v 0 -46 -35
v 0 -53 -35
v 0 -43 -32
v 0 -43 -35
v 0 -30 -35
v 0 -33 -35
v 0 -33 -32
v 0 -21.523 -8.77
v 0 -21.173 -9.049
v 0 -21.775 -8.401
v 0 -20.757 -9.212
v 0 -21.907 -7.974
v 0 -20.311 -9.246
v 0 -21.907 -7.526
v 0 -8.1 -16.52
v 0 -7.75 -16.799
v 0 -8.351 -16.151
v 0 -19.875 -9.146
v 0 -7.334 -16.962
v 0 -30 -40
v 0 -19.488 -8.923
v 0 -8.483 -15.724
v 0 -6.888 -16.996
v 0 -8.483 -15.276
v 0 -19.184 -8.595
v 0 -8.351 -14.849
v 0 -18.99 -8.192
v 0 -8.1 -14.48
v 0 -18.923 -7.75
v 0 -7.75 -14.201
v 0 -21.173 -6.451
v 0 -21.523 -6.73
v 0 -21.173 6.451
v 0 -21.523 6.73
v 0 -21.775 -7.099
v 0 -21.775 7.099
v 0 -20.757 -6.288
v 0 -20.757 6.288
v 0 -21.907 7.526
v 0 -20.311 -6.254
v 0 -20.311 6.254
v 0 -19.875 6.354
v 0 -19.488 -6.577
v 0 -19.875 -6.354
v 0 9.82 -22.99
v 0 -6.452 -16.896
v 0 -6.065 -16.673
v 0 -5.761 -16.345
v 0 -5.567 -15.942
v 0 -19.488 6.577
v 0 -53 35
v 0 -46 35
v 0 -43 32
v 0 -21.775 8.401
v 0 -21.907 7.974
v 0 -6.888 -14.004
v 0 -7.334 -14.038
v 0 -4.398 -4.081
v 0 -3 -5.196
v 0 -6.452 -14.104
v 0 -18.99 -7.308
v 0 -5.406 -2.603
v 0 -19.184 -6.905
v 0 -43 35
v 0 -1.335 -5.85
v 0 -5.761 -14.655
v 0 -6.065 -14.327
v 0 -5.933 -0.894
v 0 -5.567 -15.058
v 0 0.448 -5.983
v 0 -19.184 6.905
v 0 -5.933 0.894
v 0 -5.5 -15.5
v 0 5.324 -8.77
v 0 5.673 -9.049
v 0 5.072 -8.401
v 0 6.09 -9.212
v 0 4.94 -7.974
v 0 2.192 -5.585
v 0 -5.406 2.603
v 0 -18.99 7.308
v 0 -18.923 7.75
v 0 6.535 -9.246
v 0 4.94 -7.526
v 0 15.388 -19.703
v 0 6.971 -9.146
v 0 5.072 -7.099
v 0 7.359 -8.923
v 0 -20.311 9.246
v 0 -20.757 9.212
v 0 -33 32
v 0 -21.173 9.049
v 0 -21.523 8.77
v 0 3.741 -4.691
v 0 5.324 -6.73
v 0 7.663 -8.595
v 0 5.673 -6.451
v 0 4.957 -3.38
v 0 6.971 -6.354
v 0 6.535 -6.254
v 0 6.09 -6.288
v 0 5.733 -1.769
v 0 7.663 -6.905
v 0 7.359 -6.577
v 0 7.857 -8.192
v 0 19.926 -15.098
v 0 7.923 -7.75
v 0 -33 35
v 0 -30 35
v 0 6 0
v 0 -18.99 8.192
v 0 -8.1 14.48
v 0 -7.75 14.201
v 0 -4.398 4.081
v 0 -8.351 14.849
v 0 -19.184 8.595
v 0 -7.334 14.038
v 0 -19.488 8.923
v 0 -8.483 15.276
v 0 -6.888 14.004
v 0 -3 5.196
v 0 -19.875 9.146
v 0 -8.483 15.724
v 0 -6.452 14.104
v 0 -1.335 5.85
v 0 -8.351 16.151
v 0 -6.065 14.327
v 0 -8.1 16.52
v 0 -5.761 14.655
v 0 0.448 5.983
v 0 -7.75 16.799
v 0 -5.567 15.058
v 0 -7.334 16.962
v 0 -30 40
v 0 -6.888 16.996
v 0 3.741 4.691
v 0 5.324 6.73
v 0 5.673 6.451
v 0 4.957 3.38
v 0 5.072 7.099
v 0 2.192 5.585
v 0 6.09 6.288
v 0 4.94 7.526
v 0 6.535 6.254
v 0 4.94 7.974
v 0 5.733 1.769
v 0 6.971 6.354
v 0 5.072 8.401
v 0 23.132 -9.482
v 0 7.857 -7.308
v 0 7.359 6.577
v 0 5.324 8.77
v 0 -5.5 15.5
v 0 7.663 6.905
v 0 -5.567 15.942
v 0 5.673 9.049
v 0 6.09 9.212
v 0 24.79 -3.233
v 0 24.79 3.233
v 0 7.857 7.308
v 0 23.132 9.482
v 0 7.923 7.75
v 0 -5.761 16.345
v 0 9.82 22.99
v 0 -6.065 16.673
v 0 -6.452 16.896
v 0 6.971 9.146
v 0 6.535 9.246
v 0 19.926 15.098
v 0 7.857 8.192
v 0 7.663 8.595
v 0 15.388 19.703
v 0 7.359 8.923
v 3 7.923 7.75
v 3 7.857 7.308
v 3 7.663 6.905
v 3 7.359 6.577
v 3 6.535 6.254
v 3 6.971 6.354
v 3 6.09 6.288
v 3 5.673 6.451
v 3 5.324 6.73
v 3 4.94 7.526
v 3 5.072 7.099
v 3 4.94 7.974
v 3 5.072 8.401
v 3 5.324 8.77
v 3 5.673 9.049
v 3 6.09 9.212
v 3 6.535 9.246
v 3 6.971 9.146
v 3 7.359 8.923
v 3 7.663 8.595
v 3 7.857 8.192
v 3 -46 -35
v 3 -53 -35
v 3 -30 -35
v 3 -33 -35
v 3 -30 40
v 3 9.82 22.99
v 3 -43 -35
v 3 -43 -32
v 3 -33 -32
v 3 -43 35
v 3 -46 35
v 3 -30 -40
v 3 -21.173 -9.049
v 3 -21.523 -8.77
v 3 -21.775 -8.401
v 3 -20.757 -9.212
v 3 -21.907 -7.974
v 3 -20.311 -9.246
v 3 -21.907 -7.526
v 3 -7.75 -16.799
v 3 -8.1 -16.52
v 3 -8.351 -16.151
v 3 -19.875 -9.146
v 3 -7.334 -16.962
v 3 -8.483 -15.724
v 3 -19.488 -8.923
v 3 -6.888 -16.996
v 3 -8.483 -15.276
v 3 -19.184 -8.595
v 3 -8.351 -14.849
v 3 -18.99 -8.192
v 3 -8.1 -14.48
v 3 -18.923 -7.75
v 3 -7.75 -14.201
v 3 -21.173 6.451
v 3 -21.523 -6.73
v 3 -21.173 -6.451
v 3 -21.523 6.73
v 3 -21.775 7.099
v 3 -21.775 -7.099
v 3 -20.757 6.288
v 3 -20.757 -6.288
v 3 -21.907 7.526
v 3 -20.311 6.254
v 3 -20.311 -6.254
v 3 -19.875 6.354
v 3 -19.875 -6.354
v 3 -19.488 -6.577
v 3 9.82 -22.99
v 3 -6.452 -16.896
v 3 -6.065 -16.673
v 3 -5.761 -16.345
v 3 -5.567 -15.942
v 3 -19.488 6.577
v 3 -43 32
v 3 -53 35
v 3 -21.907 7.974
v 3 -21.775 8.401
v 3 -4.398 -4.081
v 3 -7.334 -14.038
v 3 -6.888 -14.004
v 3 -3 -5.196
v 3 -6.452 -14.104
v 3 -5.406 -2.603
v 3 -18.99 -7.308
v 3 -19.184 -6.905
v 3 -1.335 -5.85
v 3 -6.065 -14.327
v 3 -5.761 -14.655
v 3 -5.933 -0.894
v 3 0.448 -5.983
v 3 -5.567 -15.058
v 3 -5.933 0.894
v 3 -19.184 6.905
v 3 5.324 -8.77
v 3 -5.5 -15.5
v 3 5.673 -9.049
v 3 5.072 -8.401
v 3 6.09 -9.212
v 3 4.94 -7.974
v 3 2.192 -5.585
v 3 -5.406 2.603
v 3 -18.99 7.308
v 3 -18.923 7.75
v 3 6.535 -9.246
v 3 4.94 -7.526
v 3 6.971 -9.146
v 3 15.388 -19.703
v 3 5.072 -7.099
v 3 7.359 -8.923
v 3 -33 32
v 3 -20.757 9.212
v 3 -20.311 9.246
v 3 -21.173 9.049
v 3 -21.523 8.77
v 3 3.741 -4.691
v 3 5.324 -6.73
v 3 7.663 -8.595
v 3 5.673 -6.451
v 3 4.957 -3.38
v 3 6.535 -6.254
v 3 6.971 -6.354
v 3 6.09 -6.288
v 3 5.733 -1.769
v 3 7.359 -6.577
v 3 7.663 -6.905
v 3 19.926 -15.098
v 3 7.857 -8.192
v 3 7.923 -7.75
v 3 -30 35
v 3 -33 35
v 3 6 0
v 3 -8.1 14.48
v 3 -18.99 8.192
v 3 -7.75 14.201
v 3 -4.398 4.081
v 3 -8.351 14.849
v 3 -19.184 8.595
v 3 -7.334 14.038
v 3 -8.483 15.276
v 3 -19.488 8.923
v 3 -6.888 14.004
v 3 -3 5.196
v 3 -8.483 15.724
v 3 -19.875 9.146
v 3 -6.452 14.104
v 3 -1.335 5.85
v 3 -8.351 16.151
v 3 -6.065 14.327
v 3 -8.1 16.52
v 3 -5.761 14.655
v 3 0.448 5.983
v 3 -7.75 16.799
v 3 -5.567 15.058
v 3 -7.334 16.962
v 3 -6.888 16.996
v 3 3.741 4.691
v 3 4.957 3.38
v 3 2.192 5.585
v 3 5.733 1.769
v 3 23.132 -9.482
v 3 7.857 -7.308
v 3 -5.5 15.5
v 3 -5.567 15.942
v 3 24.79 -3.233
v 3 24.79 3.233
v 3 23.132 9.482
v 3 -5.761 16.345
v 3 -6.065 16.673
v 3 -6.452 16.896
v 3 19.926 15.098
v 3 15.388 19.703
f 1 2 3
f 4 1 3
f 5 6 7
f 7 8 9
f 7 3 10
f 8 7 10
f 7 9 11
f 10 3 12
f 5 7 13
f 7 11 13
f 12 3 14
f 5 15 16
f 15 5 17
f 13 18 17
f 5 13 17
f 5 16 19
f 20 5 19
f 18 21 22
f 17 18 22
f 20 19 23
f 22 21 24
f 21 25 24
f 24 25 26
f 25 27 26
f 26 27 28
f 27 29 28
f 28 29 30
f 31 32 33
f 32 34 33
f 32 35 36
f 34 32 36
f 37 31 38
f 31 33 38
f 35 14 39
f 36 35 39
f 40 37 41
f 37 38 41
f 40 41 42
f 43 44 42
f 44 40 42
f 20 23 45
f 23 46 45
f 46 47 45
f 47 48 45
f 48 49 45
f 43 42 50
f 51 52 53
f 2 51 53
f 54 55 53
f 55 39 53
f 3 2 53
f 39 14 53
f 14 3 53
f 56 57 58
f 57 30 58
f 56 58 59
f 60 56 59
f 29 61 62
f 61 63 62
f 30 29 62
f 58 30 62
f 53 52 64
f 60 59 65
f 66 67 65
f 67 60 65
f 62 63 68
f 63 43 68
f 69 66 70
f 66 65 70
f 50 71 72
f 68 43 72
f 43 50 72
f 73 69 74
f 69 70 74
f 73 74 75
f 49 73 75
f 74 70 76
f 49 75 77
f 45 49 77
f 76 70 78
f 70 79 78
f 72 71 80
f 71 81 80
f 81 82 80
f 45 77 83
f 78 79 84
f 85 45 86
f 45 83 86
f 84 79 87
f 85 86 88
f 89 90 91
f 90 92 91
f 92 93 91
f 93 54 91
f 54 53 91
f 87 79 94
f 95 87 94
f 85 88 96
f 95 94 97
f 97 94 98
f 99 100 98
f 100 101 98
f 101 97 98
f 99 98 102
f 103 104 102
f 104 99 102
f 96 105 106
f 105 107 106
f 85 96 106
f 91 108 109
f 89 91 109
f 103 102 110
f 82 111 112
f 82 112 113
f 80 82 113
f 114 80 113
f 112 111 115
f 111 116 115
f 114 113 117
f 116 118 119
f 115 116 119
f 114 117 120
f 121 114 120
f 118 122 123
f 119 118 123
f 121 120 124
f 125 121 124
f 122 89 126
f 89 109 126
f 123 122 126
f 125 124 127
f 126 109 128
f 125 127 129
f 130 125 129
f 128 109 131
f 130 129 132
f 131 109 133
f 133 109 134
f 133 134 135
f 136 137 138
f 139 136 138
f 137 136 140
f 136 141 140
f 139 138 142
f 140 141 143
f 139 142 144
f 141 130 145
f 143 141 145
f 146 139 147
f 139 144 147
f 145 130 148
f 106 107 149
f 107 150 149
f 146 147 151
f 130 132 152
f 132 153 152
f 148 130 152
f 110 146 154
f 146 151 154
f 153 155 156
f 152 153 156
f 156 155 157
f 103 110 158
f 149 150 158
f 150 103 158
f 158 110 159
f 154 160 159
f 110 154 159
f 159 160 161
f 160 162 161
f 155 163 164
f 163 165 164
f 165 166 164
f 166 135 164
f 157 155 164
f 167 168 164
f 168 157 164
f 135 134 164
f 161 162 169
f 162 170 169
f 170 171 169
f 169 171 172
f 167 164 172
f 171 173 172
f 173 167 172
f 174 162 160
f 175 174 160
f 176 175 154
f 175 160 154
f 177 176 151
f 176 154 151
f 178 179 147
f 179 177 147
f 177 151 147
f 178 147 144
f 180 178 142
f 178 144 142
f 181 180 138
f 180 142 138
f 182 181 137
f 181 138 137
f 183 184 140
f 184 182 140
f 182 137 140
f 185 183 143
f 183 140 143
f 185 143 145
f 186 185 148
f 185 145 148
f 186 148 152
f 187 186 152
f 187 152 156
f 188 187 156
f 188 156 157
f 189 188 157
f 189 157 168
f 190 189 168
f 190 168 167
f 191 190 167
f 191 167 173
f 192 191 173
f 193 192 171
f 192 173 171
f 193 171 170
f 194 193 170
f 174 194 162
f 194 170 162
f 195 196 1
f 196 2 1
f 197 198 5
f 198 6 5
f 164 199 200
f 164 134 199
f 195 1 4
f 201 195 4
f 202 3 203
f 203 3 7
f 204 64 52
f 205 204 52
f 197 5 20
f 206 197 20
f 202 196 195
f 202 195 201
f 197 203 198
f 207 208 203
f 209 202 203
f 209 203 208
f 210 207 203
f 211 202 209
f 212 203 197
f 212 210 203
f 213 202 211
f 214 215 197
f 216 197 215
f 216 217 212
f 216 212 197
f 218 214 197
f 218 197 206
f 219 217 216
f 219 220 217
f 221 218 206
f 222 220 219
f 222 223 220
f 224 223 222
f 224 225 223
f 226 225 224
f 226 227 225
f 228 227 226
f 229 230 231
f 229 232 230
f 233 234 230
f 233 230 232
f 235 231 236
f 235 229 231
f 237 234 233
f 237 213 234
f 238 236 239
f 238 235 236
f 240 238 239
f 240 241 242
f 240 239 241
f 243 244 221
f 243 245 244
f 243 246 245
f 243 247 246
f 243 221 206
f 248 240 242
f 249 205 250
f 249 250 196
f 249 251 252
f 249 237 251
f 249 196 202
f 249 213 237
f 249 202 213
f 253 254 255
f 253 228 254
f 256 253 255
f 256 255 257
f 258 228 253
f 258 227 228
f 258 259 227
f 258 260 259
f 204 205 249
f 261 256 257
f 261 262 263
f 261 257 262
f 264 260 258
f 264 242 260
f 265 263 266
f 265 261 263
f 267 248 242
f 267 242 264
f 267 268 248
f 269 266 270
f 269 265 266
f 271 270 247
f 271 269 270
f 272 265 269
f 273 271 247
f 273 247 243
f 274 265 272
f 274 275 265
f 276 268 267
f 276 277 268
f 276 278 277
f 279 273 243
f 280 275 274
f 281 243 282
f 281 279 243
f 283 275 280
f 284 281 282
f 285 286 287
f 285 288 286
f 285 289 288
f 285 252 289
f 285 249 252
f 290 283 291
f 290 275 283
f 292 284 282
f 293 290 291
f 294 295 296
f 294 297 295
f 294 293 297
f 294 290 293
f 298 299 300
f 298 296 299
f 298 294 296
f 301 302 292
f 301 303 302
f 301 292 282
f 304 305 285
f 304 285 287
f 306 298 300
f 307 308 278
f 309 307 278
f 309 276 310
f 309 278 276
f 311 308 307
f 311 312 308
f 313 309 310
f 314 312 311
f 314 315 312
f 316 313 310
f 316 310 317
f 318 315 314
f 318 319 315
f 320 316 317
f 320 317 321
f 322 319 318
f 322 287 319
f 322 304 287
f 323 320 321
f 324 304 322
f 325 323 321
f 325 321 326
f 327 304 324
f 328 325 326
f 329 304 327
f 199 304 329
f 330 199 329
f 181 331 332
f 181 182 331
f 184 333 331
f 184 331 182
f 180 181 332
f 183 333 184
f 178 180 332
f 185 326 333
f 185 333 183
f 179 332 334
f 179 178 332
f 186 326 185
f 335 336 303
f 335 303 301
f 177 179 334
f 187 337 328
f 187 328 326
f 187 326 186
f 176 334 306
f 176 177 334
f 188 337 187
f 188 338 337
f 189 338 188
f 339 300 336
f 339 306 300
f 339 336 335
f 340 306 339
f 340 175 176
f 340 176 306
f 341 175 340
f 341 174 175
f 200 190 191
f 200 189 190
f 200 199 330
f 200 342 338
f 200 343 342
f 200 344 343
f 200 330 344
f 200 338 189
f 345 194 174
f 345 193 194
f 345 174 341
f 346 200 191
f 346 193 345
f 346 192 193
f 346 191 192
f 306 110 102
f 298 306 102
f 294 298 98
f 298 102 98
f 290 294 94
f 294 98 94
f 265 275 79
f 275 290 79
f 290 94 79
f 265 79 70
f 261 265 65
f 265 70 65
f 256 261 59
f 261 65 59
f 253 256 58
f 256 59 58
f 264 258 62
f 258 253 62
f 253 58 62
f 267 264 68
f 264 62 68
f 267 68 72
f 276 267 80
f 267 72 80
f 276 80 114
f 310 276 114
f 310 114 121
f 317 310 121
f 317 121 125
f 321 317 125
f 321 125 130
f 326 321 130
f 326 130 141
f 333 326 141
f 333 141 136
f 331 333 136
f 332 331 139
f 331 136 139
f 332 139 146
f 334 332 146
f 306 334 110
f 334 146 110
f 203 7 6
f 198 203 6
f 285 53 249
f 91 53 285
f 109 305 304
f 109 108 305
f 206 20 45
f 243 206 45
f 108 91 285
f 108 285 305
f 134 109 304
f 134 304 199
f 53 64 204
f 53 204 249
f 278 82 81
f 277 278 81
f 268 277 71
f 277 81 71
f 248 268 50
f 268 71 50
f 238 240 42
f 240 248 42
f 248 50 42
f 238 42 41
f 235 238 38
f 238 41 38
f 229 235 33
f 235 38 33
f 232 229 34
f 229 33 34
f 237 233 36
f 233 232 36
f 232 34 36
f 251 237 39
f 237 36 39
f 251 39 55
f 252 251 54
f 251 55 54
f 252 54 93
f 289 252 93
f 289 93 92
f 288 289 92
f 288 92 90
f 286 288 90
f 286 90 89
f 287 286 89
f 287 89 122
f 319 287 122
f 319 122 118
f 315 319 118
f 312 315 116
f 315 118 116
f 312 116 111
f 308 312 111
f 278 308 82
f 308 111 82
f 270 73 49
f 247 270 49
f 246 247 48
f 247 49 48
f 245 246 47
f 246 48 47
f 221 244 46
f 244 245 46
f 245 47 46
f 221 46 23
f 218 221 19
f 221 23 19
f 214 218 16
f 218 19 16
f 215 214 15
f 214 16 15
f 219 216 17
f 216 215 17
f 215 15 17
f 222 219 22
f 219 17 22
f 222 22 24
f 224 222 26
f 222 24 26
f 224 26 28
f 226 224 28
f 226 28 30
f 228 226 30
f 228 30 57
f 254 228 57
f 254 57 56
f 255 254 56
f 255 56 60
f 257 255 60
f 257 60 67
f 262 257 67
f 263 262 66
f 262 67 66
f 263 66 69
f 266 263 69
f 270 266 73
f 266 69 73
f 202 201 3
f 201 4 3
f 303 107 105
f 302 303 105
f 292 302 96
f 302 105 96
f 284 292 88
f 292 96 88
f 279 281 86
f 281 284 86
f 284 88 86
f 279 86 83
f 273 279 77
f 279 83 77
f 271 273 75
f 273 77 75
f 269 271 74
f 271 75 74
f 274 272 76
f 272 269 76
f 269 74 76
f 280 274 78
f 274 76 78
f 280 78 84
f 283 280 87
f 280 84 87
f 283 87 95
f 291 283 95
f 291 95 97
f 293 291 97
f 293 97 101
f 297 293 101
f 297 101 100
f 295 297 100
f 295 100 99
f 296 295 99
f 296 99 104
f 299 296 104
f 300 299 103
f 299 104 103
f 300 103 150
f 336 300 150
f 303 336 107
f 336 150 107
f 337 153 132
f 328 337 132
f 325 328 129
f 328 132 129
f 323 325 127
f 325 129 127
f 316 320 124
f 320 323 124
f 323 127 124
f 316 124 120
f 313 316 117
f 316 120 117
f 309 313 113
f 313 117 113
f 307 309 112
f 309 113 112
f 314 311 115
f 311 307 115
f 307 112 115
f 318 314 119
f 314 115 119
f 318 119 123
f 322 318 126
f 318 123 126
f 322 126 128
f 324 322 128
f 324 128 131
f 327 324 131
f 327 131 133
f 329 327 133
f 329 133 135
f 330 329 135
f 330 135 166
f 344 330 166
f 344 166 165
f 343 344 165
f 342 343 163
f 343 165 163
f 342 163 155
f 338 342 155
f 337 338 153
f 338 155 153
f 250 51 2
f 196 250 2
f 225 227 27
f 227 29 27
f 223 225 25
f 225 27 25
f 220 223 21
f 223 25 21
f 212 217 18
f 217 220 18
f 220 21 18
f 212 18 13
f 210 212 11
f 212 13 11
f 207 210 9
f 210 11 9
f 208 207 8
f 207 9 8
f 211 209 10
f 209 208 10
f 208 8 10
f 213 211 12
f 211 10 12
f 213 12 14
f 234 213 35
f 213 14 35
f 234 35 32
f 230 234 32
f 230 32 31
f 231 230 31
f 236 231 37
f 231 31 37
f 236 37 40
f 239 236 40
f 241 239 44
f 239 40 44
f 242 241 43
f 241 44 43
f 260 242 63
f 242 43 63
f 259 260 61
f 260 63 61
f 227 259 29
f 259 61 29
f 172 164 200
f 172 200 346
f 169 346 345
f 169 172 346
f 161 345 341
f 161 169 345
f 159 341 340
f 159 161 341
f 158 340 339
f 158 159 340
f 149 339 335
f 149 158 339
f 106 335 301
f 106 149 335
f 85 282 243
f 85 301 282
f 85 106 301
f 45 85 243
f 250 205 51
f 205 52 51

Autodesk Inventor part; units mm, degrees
ref_plane "YZ Plane" through (0, 0, 0) normal (1, 0, 0) x (0, 1, 0)
ref_plane "XZ Plane" through (0, 0, 0) normal (0, 1, 0) x (-1, 0, 0)
ref_plane "XY Plane" through (0, 0, 0) normal (0, 0, 1) x (1, 0, 0)
sketch "Sketch1" plane through (0, 0, 0) normal (1, 0, 0) x (0, 1, 0)
  circle A0 centre (0, 0) radius 6
  line L0 (-30, -40) -> (9.8205, -22.9904)
  line L1 (-30, 40) -> (9.8205, 22.9904)
  line L2 (-33, -35) -> (-30, -35)
  line L3 (-33, 35) -> (-30, 35)
  line L4 (-46, 35) -> (-46, -35) construction
  line L5 (-30, 35) -> (-30, 40)
  line L6 (-30, -35) -> (-30, -40)
  line L7 (-43, 35) -> (-46, 35)
  arc A1 (9.8205, -22.9904) -> (9.8205, 22.9904) centre (0, 0) ccw
  circle A2 centre (6.4234, 7.75) radius 1.5
  circle A3 centre (6.4234, -7.75) radius 1.5
  circle A4 centre (-7, -15.5) radius 1.5
  circle A5 centre (-20.4234, -7.75) radius 1.5
  circle A6 centre (-20.4234, 7.75) radius 1.5
  circle A7 centre (-7, 15.5) radius 1.5
  line L8 (-46, -35) -> (-43, -35)
  line L9 (-43, -35) -> (-43, -32)
  line L10 (-43, -32) -> (-33, -32)
  line L11 (-33, -32) -> (-33, -35)
  line L12 (-43, 35) -> (-43, 32)
  line L13 (-43, 32) -> (-33, 32)
  line L14 (-33, 32) -> (-33, 35)
  line L15 (-46, 35) -> (-53, 35)
  line L16 (-53, 35) -> (-53, -35)
  line L17 (-53, -35) -> (-46, -35)
  point P0 (-46, 0)
  dimension "d0" = 12
  dimension "d40" = 70
  dimension "d58" = 25
  dimension "d59" = 5
  dimension "d61" = 39.8205
  dimension "d62" = 17.0096
  dimension "d63" = 39.8205
  dimension "d68" = 80
  dimension "d70" = 46
  dimension "d76" = 9.8205
  dimension "d79" = 3
  dimension "d80" = 3
  dimension "d81" = 3
  dimension "d82" = 3
  dimension "d83" = 3
  dimension "d84" = 3
  dimension "d89" = 7
  dimension "d90" = 7
  dimension "d91" = 15.5
  dimension "d92" = 15.5
  dimension "d93" = 7.75
  dimension "d94" = 7.75
  dimension "d95" = 20.4234
  dimension "d96" = 20.4234
  dimension "d97" = 7.75
  dimension "d98" = 7.75
  dimension "d99" = 6.4234
  dimension "d100" = 6.4234
  dimension "d105" = 3
  dimension "d108" = 3
  dimension "d112" = 3
  dimension "d113" = 5
  dimension "d116" = 3
  dimension "d117" = 3
  dimension "d118" = 10
  dimension "d119" = 3
  dimension "d120" = 3
  dimension "d121" = 10
  dimension "d122" = 3
  dimension "d123" = 7
  dimension "d124" = 70
  dimension "d125" = 7
extrude "Extrusion1" add sketch "Sketch1" along normal blind 3
properties part number "baseSoporte3" material "PMMA Plastic"
